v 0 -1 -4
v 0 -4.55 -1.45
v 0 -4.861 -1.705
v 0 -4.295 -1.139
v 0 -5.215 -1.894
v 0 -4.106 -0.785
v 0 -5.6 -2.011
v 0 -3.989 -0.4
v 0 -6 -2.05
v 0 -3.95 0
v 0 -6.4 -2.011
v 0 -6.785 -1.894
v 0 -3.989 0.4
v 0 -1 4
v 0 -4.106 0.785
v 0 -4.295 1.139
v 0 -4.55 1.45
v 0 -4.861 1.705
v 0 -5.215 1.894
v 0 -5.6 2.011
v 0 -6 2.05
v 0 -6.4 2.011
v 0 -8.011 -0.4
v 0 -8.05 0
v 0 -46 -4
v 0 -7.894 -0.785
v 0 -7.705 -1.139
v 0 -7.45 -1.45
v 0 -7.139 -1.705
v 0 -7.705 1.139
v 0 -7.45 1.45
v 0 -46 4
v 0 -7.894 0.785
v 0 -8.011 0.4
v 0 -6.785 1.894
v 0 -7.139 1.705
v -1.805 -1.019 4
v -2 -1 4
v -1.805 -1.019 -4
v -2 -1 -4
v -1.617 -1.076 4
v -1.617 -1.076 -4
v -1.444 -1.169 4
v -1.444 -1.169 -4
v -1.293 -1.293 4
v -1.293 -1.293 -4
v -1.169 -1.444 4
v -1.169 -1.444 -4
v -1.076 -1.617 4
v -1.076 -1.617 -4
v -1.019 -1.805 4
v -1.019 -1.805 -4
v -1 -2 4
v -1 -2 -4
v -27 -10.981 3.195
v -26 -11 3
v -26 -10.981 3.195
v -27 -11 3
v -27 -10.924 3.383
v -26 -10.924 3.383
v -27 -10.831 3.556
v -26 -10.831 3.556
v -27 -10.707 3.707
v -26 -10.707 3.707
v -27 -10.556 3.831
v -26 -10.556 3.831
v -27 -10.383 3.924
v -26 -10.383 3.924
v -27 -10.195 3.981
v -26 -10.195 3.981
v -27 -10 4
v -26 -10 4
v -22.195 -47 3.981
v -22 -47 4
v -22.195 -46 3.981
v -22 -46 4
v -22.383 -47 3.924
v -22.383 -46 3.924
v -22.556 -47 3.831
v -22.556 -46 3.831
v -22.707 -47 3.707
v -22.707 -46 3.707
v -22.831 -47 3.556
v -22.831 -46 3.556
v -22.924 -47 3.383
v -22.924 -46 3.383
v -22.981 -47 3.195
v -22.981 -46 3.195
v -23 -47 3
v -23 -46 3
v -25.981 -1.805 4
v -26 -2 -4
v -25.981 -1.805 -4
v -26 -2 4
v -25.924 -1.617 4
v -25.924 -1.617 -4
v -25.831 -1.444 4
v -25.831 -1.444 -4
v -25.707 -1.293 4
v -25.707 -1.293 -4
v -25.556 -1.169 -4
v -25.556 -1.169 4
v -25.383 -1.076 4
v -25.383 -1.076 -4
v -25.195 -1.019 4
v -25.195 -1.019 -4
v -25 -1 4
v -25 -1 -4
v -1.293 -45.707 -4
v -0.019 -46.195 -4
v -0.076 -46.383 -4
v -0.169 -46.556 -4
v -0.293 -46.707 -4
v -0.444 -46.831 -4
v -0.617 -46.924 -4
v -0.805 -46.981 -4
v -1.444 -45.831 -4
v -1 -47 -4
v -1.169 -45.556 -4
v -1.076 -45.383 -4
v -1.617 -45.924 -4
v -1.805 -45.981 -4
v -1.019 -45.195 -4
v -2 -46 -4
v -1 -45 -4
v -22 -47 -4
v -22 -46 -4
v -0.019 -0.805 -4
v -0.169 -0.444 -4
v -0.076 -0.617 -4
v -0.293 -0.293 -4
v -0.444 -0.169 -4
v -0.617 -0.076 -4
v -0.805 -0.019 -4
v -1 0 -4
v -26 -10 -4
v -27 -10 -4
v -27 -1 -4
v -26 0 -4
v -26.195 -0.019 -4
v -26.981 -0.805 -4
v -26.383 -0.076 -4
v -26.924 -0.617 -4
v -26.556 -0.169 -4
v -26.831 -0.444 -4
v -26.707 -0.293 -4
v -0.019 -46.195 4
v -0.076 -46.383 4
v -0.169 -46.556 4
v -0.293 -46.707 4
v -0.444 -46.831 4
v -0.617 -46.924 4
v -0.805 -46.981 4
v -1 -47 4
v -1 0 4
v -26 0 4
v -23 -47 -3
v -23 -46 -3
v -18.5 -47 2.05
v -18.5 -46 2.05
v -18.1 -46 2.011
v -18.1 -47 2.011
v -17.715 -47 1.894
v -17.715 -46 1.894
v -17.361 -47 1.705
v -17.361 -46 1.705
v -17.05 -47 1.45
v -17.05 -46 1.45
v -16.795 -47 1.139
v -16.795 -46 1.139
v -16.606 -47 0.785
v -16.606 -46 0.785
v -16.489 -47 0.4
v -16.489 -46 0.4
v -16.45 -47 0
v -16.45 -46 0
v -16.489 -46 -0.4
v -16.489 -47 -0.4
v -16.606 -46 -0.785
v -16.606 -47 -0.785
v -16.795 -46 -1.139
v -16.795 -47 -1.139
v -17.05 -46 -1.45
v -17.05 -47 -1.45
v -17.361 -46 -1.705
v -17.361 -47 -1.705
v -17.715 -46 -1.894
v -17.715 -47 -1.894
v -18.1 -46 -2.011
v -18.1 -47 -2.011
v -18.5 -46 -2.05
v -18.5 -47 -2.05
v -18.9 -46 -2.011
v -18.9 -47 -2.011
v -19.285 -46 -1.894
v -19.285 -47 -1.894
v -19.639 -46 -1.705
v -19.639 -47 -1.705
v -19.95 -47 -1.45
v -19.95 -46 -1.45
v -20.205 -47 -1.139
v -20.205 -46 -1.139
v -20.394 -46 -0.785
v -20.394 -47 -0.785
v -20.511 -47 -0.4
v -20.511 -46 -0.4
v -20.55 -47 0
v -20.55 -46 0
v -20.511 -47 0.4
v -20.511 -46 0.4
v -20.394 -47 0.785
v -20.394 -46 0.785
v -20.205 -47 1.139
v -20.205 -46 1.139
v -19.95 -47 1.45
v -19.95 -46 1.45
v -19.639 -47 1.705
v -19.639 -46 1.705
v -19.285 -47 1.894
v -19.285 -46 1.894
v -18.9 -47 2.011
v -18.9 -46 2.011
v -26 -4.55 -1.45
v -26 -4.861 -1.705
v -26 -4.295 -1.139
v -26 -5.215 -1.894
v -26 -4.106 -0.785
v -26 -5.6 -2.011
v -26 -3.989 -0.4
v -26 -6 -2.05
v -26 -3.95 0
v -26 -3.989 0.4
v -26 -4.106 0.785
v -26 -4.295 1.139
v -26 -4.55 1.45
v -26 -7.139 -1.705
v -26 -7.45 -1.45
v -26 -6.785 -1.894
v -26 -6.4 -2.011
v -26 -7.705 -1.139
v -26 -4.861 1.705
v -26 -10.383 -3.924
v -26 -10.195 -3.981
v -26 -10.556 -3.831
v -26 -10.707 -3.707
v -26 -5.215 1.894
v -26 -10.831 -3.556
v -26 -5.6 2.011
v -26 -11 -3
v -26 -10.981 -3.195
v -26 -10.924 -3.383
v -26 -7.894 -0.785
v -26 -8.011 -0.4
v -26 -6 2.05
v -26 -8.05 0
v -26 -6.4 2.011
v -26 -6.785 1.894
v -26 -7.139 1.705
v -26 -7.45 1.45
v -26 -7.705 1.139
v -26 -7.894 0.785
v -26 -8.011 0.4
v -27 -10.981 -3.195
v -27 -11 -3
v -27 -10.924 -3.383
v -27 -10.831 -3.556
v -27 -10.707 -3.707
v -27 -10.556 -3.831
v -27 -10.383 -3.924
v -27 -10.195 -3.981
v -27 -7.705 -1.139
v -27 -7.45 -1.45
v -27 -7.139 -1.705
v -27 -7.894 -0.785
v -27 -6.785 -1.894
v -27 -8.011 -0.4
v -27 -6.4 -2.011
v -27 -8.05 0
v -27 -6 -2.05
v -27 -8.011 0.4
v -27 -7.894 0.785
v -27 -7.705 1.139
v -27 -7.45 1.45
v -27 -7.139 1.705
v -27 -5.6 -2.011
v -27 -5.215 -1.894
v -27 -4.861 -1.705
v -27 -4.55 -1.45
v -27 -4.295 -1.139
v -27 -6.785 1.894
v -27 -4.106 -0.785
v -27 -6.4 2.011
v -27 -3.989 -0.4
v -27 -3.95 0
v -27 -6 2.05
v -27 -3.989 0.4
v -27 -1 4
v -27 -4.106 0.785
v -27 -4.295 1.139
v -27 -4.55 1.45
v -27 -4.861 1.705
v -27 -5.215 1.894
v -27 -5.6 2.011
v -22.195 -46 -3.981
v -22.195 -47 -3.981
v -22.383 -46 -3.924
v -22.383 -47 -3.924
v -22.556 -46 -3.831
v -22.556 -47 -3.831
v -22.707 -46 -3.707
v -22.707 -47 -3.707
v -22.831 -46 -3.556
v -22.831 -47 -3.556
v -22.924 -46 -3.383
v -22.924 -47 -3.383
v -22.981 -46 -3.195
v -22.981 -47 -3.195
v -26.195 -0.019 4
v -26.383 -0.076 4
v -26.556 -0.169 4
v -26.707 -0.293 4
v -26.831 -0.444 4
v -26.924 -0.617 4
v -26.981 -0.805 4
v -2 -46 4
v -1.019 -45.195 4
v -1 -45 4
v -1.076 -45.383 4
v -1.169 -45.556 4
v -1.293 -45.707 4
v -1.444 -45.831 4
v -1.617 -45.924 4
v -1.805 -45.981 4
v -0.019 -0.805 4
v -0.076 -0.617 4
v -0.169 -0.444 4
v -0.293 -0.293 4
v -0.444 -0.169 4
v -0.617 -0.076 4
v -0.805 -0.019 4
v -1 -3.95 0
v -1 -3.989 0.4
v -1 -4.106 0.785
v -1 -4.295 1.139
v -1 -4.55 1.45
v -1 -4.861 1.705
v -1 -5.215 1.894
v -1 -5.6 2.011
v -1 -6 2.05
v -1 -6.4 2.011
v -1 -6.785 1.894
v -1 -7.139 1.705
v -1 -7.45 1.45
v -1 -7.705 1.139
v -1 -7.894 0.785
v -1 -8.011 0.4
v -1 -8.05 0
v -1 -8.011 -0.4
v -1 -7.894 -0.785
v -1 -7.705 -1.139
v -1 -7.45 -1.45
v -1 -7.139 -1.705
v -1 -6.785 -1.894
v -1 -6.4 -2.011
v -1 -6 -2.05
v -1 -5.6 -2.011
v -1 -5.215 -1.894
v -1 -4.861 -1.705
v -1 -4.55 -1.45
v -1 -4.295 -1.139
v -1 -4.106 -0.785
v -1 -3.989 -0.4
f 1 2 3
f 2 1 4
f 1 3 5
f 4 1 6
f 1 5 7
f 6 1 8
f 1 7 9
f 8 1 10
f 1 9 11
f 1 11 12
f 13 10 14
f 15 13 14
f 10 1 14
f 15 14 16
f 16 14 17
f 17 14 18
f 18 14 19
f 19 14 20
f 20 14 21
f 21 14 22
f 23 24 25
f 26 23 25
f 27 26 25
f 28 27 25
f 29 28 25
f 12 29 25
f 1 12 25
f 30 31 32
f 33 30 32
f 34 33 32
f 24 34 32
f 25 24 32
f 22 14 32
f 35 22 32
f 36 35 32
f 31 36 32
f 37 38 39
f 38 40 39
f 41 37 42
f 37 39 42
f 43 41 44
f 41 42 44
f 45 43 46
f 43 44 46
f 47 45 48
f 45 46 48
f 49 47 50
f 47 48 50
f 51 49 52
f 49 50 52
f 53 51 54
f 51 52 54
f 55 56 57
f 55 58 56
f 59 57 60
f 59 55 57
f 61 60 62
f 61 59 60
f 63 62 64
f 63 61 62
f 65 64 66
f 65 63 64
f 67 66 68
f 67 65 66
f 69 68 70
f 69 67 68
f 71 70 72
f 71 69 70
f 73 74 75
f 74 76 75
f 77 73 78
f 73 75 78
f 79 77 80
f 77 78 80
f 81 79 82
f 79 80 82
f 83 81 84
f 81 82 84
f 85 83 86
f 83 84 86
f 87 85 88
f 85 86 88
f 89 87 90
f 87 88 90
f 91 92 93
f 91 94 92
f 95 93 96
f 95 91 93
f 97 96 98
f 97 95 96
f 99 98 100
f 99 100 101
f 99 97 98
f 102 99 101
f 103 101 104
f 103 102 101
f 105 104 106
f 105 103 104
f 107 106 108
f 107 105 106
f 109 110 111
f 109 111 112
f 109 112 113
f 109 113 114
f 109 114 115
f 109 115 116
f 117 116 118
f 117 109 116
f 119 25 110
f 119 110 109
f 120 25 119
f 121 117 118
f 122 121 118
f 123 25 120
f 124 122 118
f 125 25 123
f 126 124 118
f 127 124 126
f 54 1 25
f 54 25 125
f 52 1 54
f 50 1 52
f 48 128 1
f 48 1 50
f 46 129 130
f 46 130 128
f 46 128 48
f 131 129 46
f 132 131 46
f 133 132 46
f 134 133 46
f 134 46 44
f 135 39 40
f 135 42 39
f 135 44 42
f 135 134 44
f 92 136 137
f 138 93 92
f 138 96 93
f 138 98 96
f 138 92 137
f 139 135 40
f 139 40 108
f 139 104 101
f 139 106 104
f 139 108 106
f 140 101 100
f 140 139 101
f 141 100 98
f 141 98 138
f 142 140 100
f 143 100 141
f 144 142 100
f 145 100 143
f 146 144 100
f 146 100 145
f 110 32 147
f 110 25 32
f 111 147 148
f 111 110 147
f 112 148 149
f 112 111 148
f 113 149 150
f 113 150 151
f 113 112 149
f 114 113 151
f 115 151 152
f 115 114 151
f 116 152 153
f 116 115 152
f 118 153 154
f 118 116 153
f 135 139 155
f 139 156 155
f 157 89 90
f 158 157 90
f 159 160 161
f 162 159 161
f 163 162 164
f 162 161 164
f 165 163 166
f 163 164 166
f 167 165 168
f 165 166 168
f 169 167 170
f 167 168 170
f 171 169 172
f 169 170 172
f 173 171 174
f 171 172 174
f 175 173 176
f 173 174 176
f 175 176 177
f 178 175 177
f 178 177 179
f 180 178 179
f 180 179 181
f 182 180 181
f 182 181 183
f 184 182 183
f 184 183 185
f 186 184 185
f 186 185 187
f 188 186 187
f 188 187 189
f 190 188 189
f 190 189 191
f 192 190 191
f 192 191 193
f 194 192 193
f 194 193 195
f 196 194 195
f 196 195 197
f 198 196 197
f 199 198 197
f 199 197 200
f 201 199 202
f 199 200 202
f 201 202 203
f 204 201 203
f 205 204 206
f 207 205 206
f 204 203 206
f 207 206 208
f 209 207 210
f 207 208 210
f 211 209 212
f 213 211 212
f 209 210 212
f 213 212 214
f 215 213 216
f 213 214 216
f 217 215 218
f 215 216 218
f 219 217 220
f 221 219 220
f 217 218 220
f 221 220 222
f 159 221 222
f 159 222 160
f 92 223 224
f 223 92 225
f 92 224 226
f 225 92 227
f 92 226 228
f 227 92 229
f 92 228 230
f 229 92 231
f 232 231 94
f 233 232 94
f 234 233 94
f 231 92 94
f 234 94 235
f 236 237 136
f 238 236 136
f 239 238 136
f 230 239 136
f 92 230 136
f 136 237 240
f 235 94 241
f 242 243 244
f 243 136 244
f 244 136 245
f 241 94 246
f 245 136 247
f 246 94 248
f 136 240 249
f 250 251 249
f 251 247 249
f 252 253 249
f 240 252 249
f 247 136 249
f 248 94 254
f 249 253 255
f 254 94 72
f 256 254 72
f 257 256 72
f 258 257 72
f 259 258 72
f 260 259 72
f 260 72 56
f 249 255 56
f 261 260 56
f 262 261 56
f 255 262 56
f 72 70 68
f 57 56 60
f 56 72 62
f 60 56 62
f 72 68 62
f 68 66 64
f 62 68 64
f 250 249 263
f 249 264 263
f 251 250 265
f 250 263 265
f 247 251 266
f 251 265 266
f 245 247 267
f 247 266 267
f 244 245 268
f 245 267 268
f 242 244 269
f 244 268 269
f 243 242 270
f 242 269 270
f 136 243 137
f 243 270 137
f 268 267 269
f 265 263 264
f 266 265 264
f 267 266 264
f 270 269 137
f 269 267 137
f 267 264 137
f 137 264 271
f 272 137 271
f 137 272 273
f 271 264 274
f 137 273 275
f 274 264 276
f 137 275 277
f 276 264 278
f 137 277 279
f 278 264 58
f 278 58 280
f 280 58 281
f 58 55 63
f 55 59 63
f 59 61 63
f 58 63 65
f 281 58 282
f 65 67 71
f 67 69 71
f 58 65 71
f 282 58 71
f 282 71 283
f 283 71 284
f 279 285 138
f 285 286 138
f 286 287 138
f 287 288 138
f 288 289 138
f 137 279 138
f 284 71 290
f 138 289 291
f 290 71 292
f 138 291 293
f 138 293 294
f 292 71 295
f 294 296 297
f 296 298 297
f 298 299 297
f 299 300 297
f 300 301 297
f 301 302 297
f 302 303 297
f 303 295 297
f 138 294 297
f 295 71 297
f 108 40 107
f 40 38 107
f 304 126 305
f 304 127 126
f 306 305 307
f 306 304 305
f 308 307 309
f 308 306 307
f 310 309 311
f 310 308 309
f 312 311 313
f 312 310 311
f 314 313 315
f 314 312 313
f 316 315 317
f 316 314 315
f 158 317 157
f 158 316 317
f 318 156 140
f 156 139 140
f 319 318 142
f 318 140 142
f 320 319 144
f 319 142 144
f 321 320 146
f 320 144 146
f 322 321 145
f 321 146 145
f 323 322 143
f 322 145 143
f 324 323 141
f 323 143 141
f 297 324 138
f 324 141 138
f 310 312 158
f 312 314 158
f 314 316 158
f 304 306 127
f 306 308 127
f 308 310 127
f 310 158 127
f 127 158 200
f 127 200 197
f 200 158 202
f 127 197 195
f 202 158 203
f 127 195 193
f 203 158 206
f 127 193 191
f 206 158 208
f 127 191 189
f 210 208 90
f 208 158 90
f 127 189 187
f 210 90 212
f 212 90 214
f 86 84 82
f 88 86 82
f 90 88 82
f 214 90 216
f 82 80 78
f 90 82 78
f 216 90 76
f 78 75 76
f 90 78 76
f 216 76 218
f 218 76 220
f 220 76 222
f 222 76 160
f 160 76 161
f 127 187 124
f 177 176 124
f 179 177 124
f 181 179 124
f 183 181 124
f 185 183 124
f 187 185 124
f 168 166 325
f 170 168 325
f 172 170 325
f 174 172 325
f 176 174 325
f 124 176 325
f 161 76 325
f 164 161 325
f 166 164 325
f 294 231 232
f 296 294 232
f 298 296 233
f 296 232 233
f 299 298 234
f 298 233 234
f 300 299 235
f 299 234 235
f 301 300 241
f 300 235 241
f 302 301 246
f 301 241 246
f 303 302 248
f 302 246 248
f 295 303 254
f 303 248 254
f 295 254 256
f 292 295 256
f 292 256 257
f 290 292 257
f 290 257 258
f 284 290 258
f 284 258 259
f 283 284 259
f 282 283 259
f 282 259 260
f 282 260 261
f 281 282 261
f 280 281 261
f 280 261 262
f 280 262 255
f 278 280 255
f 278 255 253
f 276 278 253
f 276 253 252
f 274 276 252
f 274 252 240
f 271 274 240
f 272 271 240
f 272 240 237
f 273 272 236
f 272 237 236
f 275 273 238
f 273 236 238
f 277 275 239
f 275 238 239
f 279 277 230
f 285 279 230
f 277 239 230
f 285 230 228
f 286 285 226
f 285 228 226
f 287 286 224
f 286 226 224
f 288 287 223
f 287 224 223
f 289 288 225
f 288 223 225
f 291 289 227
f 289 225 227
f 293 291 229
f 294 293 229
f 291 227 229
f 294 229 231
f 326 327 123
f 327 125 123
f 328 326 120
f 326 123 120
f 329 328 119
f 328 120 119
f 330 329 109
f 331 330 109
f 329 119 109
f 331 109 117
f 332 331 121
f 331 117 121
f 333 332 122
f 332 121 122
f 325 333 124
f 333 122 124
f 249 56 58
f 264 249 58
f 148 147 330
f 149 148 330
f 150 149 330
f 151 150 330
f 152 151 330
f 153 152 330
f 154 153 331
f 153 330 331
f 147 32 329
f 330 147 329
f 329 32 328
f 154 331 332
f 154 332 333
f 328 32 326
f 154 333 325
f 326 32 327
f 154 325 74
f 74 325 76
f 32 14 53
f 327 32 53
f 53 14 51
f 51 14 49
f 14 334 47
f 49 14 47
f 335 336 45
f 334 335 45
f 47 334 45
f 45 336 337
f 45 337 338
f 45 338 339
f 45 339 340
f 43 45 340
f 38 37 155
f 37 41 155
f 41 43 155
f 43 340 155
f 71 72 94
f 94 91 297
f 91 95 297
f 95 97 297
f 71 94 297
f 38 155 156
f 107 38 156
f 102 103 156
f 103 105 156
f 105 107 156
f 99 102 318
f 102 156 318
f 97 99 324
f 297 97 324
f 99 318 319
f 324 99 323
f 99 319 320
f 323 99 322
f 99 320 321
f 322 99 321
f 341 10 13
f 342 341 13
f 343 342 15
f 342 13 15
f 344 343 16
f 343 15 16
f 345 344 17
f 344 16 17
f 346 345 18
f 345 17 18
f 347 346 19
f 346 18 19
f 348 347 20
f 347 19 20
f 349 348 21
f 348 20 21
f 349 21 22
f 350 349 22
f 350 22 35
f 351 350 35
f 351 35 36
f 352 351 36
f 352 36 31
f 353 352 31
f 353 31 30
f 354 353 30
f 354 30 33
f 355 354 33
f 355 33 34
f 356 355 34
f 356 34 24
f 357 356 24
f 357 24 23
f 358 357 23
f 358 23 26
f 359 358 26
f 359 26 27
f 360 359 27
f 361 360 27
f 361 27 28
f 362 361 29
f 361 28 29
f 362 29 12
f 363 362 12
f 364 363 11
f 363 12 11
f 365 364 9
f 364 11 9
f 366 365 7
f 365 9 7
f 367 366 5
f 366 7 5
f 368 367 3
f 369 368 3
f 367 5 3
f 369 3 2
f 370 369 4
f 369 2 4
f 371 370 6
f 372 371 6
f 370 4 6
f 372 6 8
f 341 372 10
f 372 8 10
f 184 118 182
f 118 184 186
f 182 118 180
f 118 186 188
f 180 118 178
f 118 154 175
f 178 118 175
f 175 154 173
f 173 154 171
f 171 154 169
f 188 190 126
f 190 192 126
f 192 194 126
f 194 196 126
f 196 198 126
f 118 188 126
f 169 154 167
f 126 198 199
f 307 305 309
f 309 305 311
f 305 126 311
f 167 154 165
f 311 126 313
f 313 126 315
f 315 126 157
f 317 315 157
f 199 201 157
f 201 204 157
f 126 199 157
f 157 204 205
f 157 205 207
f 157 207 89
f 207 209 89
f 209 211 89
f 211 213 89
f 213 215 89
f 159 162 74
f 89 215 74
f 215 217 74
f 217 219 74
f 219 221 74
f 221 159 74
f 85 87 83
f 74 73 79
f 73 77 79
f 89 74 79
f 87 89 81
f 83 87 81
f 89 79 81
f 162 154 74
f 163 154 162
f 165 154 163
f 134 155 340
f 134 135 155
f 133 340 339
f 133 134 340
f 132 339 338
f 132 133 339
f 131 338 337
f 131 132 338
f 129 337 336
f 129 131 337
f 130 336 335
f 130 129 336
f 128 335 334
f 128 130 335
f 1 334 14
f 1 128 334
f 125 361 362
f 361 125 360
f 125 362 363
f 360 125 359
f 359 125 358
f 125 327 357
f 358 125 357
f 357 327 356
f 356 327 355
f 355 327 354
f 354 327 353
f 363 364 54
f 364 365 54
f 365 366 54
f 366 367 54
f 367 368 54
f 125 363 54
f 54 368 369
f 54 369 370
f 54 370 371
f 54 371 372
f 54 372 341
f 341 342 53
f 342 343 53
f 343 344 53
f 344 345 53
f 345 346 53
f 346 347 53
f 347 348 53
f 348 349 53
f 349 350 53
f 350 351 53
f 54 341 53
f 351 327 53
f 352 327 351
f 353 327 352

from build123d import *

# Parameters (mm, degrees)
EXTRUDE_1_DEPTH     = 4
SKETCH_2_R          = 2.05
CUT_EXTRUDE_1_DEPTH = 55.350712967
SKETCH_3_R          = 2.05
CUT_EXTRUDE_2_DEPTH = 54.488316481
FILLET_1_R          = 1
FILLET_2_R          = 1
FILLET_3_R          = 1


with BuildPart() as part:
    # 草图1 → 拉伸-薄壁1 (new, symmetric)
    with BuildSketch(Plane.XY):
        Polygon((-27, -11), (-27, 0), (0, 0), (0, -47), (-23, -47), (-23, -46), (-1, -46), (-1, -1), (-26, -1), (-26, -11), align=None)
    extrude(amount=EXTRUDE_1_DEPTH, both=True)

    # 草图2 → 切除-拉伸1 (cut, through all)
    with BuildSketch(Plane(origin=(0, 0, 0), x_dir=(0, 0, -1), z_dir=(1, 0, 0))):
        with Locations(Location((0, -6, 0), (0, 0, 90))):
            Circle(SKETCH_2_R)
    extrude(amount=-CUT_EXTRUDE_1_DEPTH, mode=Mode.SUBTRACT)

    # 草图3 → 切除-拉伸2 (cut, through all)
    with BuildSketch(Plane(origin=(0, -46, 0), x_dir=(1, 0, 0), z_dir=(0, 1, 0))):
        with Locations(Location((-18.5, 0, 0), (0, 0, 270))):
            Circle(SKETCH_3_R)
    extrude(amount=-CUT_EXTRUDE_2_DEPTH, mode=Mode.SUBTRACT)

    # 圆角1
    fillet_1_edges = [part.edges().sort_by_distance(p)[0] for p in [
        (-23, -46.5, -4),
        (-26.5, -11, 4),
        (-23, -46.5, 4),
        (-26.5, -11, -4),
    ]]
    fillet(fillet_1_edges, radius=FILLET_1_R)

    # 圆角2
    fillet_2_edges = [part.edges().sort_by_distance(p)[0] for p in [
        (-1, -46, 0),
        (-1, -1, 0),
        (0, 0, 0),
        (0, -47, 0),
    ]]
    fillet(fillet_2_edges, radius=FILLET_2_R)

    # 圆角3
    fillet_3_edges = [part.edges().sort_by_distance(p)[0] for p in [
        (-26, -1, 0),
        (-27, 0, 0),
    ]]
    fillet(fillet_3_edges, radius=FILLET_3_R)


solid = part.part
